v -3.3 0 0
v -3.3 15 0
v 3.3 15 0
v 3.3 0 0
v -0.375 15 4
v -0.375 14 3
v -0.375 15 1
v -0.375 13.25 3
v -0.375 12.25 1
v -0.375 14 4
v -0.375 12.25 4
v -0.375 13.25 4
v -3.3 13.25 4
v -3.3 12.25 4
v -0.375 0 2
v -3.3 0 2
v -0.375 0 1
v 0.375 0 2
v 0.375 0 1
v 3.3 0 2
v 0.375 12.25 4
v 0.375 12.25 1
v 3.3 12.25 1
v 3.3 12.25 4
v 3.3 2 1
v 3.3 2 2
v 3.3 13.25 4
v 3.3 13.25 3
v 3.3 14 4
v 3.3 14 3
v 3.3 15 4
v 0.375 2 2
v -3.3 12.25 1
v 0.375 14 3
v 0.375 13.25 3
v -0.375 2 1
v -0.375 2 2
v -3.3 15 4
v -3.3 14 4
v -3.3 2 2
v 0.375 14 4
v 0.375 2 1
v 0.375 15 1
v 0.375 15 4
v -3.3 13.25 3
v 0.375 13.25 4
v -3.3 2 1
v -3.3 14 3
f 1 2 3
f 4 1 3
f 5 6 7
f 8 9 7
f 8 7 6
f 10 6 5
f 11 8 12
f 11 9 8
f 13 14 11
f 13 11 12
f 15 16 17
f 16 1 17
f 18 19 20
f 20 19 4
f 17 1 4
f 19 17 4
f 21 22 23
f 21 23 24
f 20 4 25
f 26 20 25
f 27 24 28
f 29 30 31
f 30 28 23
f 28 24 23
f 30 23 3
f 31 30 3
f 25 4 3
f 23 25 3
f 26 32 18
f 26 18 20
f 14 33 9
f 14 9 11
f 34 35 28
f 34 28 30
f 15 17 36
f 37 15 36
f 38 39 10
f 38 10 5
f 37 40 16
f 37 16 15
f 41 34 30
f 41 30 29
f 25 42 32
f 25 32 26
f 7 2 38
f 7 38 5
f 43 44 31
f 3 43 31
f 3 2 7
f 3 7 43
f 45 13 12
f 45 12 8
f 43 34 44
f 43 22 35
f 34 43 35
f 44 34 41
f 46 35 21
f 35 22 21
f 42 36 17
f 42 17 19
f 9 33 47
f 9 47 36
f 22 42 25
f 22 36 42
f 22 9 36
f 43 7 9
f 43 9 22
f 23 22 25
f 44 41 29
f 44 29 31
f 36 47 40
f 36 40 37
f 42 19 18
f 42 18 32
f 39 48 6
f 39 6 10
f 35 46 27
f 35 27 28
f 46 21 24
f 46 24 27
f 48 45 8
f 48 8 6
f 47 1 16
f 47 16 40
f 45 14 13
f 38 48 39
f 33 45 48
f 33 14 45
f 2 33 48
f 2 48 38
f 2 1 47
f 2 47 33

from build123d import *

# Parameters (mm, degrees)
SKETCH_W     = 6.6
SKETCH_H     = 15
PAD_DEPTH    = 1
SKETCH001_W  = 2.925
SKETCH001_H  = 2
PAD001_DEPTH = 1
PAD002_DEPTH = 6.6
SKETCH003_W  = 0.75
SKETCH003_H  = 3
POCKET_DEPTH = 15.001


with BuildPart() as part:
    # Sketch → Pad (new body)
    with BuildSketch(Plane.XY):
        with Locations((0, 7.5)):
            Rectangle(SKETCH_W, SKETCH_H)
    extrude(amount=PAD_DEPTH)

    # Sketch001 → Pad001 (new body)
    with BuildSketch(Plane.XY.offset(1)):
        with Locations((-1.8375, 1)):
            Rectangle(SKETCH001_W, SKETCH001_H)
        with Locations((1.8375, 1)):
            Rectangle(SKETCH001_W, SKETCH001_H)
    extrude(amount=PAD001_DEPTH)

    # Sketch002 → Pad002 (new body)
    with BuildSketch(Plane(origin=(-3.3, 0, 0), x_dir=(0, -1, 0), z_dir=(-1, 0, 0))):
        Polygon((-15, 0), (-12.25, 0), (-12.25, 4), (-13.25, 4), (-13.25, 3), (-14, 3), (-14, 4), (-15, 4), align=None)
    extrude(amount=-PAD002_DEPTH)

    # Sketch003 → Pocket (cut, through all)
    with BuildSketch(Plane.XZ):
        with Locations((0, 2.5)):
            Rectangle(SKETCH003_W, SKETCH003_H)
    extrude(amount=-POCKET_DEPTH, mode=Mode.SUBTRACT)


solid = part.part
